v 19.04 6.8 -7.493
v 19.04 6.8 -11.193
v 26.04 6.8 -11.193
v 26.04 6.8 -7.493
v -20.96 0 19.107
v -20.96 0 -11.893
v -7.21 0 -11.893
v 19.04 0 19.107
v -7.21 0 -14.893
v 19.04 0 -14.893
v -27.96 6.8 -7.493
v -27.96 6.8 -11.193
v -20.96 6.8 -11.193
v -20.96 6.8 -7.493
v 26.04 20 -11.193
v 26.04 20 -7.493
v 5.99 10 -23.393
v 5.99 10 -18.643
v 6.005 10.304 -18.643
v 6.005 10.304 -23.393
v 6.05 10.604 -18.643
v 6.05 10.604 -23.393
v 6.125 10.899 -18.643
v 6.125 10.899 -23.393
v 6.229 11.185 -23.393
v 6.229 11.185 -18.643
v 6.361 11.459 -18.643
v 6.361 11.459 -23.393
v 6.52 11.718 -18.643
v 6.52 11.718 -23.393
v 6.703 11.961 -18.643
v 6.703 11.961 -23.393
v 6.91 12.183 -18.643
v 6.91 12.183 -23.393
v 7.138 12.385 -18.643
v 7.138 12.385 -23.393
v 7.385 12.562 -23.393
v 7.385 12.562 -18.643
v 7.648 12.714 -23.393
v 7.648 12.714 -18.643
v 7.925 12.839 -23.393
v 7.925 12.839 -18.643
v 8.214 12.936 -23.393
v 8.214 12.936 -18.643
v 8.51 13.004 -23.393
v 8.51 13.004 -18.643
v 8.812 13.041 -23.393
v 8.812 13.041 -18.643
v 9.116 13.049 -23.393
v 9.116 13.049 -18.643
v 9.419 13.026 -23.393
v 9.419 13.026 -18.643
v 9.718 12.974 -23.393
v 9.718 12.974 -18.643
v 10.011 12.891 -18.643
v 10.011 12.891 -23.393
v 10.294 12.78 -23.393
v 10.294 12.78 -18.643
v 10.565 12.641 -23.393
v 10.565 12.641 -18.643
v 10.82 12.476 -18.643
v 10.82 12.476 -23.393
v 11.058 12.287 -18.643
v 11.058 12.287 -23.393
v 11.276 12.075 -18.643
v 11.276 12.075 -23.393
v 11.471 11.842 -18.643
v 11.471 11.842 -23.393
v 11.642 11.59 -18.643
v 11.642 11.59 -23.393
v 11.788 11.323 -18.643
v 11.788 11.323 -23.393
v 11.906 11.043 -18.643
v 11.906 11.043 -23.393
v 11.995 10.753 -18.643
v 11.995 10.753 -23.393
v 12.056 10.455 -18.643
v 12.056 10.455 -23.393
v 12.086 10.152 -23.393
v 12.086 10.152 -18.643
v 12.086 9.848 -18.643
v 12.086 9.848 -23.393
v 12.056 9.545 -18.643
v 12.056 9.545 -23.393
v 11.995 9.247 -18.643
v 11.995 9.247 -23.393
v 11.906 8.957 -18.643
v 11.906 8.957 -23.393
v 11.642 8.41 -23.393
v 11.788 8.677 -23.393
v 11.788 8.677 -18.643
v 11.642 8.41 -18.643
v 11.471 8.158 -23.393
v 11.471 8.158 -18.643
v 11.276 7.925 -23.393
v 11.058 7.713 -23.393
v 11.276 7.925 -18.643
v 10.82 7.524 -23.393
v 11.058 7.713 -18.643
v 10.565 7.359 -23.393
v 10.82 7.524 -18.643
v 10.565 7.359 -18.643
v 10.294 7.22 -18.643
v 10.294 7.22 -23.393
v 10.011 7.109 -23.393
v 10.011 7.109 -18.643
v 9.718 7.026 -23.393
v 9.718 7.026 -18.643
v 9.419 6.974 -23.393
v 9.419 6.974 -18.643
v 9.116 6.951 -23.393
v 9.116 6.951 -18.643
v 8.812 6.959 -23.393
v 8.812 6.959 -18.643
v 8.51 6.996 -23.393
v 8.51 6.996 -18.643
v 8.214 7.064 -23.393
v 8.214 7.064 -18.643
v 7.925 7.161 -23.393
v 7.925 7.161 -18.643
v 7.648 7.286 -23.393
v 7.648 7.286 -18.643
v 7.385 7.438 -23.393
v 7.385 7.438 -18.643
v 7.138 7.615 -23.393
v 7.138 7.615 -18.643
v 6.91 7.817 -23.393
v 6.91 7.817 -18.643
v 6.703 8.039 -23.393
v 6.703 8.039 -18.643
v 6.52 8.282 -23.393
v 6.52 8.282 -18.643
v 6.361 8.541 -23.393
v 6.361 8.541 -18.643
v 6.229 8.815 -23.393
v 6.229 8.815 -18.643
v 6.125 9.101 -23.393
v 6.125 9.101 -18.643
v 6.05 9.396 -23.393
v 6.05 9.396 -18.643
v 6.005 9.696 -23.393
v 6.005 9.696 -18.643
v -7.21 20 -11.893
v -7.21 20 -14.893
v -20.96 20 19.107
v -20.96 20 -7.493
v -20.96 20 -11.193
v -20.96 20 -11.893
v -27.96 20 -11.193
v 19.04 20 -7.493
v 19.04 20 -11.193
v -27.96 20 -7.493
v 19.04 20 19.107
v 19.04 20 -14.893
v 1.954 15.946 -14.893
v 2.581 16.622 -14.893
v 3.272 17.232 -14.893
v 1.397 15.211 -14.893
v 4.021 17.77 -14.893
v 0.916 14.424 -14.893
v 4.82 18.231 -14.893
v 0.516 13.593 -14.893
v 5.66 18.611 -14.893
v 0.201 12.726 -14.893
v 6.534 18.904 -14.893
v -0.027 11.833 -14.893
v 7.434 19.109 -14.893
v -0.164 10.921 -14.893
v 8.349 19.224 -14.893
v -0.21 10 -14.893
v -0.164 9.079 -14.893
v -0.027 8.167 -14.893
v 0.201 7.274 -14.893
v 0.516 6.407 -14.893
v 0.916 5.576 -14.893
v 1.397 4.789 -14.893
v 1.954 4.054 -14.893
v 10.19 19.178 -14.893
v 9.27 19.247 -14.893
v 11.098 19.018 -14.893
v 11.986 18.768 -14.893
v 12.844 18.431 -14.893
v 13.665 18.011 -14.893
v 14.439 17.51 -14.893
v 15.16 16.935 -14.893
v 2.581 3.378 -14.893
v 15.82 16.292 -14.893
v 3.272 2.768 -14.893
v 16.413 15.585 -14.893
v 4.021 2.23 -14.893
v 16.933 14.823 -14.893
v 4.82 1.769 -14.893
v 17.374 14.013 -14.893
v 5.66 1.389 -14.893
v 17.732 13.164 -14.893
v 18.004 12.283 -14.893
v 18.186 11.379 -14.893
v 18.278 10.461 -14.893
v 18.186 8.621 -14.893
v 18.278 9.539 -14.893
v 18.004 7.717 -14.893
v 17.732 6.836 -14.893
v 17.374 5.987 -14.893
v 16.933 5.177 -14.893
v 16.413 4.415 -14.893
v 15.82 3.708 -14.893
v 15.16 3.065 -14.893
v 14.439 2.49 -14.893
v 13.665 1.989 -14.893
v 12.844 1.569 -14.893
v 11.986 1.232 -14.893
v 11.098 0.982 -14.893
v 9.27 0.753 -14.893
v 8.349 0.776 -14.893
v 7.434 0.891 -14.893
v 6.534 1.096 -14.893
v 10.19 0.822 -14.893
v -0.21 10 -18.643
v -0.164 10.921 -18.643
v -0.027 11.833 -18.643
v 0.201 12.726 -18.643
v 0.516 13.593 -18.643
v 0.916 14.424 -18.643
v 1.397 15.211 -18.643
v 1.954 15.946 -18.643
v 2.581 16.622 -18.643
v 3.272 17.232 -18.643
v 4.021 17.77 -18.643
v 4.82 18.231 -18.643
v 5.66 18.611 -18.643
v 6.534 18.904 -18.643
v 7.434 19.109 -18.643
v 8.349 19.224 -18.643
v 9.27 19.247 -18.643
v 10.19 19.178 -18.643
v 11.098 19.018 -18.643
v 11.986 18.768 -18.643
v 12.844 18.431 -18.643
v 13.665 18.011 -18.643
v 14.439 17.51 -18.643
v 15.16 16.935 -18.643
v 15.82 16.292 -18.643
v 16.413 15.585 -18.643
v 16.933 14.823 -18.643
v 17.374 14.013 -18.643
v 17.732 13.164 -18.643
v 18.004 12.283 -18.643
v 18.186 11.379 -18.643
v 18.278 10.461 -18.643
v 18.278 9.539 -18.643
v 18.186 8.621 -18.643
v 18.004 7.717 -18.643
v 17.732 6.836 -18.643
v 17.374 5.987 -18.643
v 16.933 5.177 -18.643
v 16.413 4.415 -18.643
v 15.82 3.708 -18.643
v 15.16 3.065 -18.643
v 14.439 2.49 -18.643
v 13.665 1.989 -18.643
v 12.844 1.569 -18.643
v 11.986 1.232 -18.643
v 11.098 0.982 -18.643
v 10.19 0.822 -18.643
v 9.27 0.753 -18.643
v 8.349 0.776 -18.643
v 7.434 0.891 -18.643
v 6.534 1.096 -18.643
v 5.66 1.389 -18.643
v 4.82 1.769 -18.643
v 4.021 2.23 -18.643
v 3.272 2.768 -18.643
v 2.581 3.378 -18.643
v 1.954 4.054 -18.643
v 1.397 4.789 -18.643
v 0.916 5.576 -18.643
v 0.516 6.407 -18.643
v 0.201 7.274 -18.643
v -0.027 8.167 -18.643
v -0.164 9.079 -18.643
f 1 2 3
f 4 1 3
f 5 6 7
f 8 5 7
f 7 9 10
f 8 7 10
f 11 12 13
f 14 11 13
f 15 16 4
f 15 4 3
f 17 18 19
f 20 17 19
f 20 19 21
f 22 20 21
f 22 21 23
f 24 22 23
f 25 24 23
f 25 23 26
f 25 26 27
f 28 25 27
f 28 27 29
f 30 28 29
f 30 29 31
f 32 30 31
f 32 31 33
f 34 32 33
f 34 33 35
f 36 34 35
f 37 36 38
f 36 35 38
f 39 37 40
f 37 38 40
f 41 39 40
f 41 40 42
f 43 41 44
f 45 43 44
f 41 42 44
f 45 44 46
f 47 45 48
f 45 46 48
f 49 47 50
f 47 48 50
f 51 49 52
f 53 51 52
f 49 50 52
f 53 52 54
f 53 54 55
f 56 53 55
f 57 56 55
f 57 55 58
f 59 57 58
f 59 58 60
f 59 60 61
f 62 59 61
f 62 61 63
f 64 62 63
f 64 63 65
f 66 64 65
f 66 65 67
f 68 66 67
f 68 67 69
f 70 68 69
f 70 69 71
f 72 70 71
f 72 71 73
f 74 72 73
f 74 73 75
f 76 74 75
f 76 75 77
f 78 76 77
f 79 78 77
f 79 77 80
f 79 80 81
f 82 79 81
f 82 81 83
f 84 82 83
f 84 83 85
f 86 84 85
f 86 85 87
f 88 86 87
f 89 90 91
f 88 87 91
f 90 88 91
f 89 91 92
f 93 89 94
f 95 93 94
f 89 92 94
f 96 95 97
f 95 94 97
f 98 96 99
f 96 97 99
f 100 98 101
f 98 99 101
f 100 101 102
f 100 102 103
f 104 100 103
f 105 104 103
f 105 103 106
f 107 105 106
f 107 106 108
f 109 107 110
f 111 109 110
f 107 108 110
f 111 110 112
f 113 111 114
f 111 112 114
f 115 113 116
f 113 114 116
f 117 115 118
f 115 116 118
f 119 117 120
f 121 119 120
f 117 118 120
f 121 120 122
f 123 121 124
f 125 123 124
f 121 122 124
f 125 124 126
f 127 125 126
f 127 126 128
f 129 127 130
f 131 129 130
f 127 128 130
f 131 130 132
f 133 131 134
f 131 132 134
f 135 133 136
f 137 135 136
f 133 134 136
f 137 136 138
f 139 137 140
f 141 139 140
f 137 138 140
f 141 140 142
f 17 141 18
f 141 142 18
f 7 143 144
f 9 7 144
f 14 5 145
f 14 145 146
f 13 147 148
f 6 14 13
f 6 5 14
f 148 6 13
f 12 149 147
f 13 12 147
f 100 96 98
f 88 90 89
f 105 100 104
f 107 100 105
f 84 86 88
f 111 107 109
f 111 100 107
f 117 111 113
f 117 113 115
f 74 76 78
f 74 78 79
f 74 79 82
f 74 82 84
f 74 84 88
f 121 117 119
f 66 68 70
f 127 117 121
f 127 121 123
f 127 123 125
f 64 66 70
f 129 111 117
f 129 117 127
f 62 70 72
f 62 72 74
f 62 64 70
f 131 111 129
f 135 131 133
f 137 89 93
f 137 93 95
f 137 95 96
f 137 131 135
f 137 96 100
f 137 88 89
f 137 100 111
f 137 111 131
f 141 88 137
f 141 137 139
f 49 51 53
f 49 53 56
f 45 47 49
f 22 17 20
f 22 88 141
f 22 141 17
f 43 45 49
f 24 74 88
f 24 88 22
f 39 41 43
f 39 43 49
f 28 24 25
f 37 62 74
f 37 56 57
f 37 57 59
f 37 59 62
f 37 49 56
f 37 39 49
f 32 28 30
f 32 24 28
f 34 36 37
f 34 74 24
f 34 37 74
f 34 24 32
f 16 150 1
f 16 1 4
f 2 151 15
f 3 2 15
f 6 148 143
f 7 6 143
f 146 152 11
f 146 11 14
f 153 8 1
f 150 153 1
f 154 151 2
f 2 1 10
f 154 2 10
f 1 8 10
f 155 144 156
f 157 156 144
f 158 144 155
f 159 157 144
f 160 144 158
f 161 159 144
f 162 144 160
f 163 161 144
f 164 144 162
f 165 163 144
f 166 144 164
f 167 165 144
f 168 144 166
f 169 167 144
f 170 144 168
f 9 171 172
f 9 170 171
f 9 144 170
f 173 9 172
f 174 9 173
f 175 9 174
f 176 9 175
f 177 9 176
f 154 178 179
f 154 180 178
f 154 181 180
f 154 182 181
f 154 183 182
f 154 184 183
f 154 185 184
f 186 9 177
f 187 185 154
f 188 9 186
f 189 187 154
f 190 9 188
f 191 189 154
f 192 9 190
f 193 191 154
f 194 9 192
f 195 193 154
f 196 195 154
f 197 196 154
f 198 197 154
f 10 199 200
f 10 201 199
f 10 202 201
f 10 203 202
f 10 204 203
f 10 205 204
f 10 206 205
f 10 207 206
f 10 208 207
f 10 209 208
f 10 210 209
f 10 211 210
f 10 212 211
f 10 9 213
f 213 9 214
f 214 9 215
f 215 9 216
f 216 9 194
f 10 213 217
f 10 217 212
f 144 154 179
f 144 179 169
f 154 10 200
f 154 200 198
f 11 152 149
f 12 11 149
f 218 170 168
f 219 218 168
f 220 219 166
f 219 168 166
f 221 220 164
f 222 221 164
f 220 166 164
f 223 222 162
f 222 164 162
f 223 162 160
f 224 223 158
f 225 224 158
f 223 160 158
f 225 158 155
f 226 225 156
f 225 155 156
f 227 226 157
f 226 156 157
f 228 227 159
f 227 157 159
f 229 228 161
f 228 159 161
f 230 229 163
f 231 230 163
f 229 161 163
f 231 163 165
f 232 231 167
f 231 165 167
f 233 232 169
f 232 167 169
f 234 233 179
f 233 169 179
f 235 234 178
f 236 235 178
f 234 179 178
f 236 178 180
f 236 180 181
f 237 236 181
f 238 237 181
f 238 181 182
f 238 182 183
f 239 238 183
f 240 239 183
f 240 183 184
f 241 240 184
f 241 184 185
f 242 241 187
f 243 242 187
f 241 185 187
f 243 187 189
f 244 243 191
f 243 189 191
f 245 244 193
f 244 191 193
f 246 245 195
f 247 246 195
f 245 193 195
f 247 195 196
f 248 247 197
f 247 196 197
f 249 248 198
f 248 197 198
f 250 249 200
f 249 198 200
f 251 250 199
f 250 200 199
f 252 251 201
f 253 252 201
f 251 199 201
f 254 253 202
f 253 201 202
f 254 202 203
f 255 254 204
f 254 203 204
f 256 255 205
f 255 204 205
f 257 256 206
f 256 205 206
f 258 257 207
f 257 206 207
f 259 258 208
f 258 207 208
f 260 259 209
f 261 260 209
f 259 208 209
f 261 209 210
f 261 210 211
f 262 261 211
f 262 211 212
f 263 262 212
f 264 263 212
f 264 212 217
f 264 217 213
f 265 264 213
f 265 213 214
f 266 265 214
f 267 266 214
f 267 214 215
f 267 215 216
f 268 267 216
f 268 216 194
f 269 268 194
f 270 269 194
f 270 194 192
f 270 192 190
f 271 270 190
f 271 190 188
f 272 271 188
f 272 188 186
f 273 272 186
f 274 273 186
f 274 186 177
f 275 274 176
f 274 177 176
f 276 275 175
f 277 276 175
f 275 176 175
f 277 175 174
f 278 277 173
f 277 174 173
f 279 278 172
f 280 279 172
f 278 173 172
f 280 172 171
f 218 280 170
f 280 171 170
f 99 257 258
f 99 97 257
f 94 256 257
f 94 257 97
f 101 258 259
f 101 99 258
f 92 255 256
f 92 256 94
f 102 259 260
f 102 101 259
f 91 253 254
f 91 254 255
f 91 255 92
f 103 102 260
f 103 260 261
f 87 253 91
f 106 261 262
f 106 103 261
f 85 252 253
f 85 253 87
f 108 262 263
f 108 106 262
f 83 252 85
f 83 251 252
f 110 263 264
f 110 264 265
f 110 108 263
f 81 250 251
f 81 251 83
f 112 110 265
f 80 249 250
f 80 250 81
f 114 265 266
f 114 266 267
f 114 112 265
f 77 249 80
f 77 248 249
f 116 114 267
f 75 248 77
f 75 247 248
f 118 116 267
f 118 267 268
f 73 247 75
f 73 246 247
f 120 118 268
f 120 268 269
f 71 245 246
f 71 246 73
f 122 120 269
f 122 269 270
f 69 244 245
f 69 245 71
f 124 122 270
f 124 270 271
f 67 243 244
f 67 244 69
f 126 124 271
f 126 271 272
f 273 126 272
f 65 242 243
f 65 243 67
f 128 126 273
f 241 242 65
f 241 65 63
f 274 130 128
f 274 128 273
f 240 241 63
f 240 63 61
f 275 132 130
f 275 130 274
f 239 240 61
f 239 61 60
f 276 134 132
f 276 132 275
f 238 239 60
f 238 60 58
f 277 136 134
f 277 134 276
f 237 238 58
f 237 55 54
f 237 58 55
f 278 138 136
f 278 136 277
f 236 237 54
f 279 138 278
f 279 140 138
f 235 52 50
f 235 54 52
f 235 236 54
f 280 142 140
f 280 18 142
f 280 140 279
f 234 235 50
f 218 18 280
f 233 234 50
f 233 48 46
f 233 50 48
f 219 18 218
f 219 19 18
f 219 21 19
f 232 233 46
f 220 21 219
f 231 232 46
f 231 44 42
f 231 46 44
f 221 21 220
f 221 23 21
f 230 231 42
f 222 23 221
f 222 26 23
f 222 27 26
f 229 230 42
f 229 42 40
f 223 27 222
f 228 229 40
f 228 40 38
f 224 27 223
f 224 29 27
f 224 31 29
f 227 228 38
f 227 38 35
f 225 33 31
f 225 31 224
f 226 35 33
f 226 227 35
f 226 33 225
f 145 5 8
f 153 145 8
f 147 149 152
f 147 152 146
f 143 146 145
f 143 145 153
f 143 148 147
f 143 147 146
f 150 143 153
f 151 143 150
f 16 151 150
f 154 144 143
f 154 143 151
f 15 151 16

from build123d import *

# Parameters (mm, degrees)
SKETCH1_W           = 40
SKETCH1_H           = 34
BOSS_EXTRUDE1_DEPTH = 20
SKETCH2_W           = 13.75
SKETCH2_H           = 3
CUT_EXTRUDE1_DEPTH  = 21
SKETCH3_R           = 9.25
SKETCH3_R_2         = 3.05
BOSS_EXTRUDE2_DEPTH = 3.75
SKETCH4_W           = 7
SKETCH4_H           = 3.7
BOSS_EXTRUDE3_DEPTH = 13.2
SKETCH8_R           = 3.05
BOSS_EXTRUDE5_DEPTH = 8.5


with BuildPart() as part:
    # Sketch1 → Boss-Extrude1 (new body)
    with BuildSketch(Plane(origin=(0, 0, 0), x_dir=(1, 0, 0), z_dir=(0, 1, 0))):
        with Locations((-0.96024493, -2.107462687)):
            Rectangle(SKETCH1_W, SKETCH1_H)
    extrude(amount=BOSS_EXTRUDE1_DEPTH)

    # Sketch2 → Cut-Extrude1 (cut, through all)
    with BuildSketch(Plane(origin=(0, 20, 0), x_dir=(1, 0, 0), z_dir=(0, 1, 0))):
        with Locations((-14.08524493, 13.392537313)):
            Rectangle(SKETCH2_W, SKETCH2_H)
    extrude(amount=-CUT_EXTRUDE1_DEPTH, mode=Mode.SUBTRACT)

    # Sketch3 → Boss-Extrude2 (add)
    with BuildSketch(Plane(origin=(0, 0, -14.892537313), x_dir=(-1, 0, 0), z_dir=(0, 0, -1))):
        with Locations((-9.03975507, 10)):
            Circle(SKETCH3_R)
        with Locations((-9.03975507, 10)):
            Circle(SKETCH3_R_2, mode=Mode.SUBTRACT)
    extrude(amount=BOSS_EXTRUDE2_DEPTH)

    # Sketch4 → Boss-Extrude3 (add)
    with BuildSketch(Plane(origin=(0, 20, 0), x_dir=(1, 0, 0), z_dir=(0, 1, 0))):
        with Locations((-24.46024493, 9.342537313)):
            Rectangle(SKETCH4_W, SKETCH4_H)
        with Locations((22.53975507, 9.342537313)):
            Rectangle(SKETCH4_W, SKETCH4_H)
    extrude(amount=-BOSS_EXTRUDE3_DEPTH)

    # Sketch8 → Boss-Extrude5 (add)
    with BuildSketch(Plane(origin=(0, 0, -14.892537313), x_dir=(-1, 0, 0), z_dir=(0, 0, -1))):
        with Locations((-9.03975507, 10)):
            Circle(SKETCH8_R)
    extrude(amount=BOSS_EXTRUDE5_DEPTH)


solid = part.part
